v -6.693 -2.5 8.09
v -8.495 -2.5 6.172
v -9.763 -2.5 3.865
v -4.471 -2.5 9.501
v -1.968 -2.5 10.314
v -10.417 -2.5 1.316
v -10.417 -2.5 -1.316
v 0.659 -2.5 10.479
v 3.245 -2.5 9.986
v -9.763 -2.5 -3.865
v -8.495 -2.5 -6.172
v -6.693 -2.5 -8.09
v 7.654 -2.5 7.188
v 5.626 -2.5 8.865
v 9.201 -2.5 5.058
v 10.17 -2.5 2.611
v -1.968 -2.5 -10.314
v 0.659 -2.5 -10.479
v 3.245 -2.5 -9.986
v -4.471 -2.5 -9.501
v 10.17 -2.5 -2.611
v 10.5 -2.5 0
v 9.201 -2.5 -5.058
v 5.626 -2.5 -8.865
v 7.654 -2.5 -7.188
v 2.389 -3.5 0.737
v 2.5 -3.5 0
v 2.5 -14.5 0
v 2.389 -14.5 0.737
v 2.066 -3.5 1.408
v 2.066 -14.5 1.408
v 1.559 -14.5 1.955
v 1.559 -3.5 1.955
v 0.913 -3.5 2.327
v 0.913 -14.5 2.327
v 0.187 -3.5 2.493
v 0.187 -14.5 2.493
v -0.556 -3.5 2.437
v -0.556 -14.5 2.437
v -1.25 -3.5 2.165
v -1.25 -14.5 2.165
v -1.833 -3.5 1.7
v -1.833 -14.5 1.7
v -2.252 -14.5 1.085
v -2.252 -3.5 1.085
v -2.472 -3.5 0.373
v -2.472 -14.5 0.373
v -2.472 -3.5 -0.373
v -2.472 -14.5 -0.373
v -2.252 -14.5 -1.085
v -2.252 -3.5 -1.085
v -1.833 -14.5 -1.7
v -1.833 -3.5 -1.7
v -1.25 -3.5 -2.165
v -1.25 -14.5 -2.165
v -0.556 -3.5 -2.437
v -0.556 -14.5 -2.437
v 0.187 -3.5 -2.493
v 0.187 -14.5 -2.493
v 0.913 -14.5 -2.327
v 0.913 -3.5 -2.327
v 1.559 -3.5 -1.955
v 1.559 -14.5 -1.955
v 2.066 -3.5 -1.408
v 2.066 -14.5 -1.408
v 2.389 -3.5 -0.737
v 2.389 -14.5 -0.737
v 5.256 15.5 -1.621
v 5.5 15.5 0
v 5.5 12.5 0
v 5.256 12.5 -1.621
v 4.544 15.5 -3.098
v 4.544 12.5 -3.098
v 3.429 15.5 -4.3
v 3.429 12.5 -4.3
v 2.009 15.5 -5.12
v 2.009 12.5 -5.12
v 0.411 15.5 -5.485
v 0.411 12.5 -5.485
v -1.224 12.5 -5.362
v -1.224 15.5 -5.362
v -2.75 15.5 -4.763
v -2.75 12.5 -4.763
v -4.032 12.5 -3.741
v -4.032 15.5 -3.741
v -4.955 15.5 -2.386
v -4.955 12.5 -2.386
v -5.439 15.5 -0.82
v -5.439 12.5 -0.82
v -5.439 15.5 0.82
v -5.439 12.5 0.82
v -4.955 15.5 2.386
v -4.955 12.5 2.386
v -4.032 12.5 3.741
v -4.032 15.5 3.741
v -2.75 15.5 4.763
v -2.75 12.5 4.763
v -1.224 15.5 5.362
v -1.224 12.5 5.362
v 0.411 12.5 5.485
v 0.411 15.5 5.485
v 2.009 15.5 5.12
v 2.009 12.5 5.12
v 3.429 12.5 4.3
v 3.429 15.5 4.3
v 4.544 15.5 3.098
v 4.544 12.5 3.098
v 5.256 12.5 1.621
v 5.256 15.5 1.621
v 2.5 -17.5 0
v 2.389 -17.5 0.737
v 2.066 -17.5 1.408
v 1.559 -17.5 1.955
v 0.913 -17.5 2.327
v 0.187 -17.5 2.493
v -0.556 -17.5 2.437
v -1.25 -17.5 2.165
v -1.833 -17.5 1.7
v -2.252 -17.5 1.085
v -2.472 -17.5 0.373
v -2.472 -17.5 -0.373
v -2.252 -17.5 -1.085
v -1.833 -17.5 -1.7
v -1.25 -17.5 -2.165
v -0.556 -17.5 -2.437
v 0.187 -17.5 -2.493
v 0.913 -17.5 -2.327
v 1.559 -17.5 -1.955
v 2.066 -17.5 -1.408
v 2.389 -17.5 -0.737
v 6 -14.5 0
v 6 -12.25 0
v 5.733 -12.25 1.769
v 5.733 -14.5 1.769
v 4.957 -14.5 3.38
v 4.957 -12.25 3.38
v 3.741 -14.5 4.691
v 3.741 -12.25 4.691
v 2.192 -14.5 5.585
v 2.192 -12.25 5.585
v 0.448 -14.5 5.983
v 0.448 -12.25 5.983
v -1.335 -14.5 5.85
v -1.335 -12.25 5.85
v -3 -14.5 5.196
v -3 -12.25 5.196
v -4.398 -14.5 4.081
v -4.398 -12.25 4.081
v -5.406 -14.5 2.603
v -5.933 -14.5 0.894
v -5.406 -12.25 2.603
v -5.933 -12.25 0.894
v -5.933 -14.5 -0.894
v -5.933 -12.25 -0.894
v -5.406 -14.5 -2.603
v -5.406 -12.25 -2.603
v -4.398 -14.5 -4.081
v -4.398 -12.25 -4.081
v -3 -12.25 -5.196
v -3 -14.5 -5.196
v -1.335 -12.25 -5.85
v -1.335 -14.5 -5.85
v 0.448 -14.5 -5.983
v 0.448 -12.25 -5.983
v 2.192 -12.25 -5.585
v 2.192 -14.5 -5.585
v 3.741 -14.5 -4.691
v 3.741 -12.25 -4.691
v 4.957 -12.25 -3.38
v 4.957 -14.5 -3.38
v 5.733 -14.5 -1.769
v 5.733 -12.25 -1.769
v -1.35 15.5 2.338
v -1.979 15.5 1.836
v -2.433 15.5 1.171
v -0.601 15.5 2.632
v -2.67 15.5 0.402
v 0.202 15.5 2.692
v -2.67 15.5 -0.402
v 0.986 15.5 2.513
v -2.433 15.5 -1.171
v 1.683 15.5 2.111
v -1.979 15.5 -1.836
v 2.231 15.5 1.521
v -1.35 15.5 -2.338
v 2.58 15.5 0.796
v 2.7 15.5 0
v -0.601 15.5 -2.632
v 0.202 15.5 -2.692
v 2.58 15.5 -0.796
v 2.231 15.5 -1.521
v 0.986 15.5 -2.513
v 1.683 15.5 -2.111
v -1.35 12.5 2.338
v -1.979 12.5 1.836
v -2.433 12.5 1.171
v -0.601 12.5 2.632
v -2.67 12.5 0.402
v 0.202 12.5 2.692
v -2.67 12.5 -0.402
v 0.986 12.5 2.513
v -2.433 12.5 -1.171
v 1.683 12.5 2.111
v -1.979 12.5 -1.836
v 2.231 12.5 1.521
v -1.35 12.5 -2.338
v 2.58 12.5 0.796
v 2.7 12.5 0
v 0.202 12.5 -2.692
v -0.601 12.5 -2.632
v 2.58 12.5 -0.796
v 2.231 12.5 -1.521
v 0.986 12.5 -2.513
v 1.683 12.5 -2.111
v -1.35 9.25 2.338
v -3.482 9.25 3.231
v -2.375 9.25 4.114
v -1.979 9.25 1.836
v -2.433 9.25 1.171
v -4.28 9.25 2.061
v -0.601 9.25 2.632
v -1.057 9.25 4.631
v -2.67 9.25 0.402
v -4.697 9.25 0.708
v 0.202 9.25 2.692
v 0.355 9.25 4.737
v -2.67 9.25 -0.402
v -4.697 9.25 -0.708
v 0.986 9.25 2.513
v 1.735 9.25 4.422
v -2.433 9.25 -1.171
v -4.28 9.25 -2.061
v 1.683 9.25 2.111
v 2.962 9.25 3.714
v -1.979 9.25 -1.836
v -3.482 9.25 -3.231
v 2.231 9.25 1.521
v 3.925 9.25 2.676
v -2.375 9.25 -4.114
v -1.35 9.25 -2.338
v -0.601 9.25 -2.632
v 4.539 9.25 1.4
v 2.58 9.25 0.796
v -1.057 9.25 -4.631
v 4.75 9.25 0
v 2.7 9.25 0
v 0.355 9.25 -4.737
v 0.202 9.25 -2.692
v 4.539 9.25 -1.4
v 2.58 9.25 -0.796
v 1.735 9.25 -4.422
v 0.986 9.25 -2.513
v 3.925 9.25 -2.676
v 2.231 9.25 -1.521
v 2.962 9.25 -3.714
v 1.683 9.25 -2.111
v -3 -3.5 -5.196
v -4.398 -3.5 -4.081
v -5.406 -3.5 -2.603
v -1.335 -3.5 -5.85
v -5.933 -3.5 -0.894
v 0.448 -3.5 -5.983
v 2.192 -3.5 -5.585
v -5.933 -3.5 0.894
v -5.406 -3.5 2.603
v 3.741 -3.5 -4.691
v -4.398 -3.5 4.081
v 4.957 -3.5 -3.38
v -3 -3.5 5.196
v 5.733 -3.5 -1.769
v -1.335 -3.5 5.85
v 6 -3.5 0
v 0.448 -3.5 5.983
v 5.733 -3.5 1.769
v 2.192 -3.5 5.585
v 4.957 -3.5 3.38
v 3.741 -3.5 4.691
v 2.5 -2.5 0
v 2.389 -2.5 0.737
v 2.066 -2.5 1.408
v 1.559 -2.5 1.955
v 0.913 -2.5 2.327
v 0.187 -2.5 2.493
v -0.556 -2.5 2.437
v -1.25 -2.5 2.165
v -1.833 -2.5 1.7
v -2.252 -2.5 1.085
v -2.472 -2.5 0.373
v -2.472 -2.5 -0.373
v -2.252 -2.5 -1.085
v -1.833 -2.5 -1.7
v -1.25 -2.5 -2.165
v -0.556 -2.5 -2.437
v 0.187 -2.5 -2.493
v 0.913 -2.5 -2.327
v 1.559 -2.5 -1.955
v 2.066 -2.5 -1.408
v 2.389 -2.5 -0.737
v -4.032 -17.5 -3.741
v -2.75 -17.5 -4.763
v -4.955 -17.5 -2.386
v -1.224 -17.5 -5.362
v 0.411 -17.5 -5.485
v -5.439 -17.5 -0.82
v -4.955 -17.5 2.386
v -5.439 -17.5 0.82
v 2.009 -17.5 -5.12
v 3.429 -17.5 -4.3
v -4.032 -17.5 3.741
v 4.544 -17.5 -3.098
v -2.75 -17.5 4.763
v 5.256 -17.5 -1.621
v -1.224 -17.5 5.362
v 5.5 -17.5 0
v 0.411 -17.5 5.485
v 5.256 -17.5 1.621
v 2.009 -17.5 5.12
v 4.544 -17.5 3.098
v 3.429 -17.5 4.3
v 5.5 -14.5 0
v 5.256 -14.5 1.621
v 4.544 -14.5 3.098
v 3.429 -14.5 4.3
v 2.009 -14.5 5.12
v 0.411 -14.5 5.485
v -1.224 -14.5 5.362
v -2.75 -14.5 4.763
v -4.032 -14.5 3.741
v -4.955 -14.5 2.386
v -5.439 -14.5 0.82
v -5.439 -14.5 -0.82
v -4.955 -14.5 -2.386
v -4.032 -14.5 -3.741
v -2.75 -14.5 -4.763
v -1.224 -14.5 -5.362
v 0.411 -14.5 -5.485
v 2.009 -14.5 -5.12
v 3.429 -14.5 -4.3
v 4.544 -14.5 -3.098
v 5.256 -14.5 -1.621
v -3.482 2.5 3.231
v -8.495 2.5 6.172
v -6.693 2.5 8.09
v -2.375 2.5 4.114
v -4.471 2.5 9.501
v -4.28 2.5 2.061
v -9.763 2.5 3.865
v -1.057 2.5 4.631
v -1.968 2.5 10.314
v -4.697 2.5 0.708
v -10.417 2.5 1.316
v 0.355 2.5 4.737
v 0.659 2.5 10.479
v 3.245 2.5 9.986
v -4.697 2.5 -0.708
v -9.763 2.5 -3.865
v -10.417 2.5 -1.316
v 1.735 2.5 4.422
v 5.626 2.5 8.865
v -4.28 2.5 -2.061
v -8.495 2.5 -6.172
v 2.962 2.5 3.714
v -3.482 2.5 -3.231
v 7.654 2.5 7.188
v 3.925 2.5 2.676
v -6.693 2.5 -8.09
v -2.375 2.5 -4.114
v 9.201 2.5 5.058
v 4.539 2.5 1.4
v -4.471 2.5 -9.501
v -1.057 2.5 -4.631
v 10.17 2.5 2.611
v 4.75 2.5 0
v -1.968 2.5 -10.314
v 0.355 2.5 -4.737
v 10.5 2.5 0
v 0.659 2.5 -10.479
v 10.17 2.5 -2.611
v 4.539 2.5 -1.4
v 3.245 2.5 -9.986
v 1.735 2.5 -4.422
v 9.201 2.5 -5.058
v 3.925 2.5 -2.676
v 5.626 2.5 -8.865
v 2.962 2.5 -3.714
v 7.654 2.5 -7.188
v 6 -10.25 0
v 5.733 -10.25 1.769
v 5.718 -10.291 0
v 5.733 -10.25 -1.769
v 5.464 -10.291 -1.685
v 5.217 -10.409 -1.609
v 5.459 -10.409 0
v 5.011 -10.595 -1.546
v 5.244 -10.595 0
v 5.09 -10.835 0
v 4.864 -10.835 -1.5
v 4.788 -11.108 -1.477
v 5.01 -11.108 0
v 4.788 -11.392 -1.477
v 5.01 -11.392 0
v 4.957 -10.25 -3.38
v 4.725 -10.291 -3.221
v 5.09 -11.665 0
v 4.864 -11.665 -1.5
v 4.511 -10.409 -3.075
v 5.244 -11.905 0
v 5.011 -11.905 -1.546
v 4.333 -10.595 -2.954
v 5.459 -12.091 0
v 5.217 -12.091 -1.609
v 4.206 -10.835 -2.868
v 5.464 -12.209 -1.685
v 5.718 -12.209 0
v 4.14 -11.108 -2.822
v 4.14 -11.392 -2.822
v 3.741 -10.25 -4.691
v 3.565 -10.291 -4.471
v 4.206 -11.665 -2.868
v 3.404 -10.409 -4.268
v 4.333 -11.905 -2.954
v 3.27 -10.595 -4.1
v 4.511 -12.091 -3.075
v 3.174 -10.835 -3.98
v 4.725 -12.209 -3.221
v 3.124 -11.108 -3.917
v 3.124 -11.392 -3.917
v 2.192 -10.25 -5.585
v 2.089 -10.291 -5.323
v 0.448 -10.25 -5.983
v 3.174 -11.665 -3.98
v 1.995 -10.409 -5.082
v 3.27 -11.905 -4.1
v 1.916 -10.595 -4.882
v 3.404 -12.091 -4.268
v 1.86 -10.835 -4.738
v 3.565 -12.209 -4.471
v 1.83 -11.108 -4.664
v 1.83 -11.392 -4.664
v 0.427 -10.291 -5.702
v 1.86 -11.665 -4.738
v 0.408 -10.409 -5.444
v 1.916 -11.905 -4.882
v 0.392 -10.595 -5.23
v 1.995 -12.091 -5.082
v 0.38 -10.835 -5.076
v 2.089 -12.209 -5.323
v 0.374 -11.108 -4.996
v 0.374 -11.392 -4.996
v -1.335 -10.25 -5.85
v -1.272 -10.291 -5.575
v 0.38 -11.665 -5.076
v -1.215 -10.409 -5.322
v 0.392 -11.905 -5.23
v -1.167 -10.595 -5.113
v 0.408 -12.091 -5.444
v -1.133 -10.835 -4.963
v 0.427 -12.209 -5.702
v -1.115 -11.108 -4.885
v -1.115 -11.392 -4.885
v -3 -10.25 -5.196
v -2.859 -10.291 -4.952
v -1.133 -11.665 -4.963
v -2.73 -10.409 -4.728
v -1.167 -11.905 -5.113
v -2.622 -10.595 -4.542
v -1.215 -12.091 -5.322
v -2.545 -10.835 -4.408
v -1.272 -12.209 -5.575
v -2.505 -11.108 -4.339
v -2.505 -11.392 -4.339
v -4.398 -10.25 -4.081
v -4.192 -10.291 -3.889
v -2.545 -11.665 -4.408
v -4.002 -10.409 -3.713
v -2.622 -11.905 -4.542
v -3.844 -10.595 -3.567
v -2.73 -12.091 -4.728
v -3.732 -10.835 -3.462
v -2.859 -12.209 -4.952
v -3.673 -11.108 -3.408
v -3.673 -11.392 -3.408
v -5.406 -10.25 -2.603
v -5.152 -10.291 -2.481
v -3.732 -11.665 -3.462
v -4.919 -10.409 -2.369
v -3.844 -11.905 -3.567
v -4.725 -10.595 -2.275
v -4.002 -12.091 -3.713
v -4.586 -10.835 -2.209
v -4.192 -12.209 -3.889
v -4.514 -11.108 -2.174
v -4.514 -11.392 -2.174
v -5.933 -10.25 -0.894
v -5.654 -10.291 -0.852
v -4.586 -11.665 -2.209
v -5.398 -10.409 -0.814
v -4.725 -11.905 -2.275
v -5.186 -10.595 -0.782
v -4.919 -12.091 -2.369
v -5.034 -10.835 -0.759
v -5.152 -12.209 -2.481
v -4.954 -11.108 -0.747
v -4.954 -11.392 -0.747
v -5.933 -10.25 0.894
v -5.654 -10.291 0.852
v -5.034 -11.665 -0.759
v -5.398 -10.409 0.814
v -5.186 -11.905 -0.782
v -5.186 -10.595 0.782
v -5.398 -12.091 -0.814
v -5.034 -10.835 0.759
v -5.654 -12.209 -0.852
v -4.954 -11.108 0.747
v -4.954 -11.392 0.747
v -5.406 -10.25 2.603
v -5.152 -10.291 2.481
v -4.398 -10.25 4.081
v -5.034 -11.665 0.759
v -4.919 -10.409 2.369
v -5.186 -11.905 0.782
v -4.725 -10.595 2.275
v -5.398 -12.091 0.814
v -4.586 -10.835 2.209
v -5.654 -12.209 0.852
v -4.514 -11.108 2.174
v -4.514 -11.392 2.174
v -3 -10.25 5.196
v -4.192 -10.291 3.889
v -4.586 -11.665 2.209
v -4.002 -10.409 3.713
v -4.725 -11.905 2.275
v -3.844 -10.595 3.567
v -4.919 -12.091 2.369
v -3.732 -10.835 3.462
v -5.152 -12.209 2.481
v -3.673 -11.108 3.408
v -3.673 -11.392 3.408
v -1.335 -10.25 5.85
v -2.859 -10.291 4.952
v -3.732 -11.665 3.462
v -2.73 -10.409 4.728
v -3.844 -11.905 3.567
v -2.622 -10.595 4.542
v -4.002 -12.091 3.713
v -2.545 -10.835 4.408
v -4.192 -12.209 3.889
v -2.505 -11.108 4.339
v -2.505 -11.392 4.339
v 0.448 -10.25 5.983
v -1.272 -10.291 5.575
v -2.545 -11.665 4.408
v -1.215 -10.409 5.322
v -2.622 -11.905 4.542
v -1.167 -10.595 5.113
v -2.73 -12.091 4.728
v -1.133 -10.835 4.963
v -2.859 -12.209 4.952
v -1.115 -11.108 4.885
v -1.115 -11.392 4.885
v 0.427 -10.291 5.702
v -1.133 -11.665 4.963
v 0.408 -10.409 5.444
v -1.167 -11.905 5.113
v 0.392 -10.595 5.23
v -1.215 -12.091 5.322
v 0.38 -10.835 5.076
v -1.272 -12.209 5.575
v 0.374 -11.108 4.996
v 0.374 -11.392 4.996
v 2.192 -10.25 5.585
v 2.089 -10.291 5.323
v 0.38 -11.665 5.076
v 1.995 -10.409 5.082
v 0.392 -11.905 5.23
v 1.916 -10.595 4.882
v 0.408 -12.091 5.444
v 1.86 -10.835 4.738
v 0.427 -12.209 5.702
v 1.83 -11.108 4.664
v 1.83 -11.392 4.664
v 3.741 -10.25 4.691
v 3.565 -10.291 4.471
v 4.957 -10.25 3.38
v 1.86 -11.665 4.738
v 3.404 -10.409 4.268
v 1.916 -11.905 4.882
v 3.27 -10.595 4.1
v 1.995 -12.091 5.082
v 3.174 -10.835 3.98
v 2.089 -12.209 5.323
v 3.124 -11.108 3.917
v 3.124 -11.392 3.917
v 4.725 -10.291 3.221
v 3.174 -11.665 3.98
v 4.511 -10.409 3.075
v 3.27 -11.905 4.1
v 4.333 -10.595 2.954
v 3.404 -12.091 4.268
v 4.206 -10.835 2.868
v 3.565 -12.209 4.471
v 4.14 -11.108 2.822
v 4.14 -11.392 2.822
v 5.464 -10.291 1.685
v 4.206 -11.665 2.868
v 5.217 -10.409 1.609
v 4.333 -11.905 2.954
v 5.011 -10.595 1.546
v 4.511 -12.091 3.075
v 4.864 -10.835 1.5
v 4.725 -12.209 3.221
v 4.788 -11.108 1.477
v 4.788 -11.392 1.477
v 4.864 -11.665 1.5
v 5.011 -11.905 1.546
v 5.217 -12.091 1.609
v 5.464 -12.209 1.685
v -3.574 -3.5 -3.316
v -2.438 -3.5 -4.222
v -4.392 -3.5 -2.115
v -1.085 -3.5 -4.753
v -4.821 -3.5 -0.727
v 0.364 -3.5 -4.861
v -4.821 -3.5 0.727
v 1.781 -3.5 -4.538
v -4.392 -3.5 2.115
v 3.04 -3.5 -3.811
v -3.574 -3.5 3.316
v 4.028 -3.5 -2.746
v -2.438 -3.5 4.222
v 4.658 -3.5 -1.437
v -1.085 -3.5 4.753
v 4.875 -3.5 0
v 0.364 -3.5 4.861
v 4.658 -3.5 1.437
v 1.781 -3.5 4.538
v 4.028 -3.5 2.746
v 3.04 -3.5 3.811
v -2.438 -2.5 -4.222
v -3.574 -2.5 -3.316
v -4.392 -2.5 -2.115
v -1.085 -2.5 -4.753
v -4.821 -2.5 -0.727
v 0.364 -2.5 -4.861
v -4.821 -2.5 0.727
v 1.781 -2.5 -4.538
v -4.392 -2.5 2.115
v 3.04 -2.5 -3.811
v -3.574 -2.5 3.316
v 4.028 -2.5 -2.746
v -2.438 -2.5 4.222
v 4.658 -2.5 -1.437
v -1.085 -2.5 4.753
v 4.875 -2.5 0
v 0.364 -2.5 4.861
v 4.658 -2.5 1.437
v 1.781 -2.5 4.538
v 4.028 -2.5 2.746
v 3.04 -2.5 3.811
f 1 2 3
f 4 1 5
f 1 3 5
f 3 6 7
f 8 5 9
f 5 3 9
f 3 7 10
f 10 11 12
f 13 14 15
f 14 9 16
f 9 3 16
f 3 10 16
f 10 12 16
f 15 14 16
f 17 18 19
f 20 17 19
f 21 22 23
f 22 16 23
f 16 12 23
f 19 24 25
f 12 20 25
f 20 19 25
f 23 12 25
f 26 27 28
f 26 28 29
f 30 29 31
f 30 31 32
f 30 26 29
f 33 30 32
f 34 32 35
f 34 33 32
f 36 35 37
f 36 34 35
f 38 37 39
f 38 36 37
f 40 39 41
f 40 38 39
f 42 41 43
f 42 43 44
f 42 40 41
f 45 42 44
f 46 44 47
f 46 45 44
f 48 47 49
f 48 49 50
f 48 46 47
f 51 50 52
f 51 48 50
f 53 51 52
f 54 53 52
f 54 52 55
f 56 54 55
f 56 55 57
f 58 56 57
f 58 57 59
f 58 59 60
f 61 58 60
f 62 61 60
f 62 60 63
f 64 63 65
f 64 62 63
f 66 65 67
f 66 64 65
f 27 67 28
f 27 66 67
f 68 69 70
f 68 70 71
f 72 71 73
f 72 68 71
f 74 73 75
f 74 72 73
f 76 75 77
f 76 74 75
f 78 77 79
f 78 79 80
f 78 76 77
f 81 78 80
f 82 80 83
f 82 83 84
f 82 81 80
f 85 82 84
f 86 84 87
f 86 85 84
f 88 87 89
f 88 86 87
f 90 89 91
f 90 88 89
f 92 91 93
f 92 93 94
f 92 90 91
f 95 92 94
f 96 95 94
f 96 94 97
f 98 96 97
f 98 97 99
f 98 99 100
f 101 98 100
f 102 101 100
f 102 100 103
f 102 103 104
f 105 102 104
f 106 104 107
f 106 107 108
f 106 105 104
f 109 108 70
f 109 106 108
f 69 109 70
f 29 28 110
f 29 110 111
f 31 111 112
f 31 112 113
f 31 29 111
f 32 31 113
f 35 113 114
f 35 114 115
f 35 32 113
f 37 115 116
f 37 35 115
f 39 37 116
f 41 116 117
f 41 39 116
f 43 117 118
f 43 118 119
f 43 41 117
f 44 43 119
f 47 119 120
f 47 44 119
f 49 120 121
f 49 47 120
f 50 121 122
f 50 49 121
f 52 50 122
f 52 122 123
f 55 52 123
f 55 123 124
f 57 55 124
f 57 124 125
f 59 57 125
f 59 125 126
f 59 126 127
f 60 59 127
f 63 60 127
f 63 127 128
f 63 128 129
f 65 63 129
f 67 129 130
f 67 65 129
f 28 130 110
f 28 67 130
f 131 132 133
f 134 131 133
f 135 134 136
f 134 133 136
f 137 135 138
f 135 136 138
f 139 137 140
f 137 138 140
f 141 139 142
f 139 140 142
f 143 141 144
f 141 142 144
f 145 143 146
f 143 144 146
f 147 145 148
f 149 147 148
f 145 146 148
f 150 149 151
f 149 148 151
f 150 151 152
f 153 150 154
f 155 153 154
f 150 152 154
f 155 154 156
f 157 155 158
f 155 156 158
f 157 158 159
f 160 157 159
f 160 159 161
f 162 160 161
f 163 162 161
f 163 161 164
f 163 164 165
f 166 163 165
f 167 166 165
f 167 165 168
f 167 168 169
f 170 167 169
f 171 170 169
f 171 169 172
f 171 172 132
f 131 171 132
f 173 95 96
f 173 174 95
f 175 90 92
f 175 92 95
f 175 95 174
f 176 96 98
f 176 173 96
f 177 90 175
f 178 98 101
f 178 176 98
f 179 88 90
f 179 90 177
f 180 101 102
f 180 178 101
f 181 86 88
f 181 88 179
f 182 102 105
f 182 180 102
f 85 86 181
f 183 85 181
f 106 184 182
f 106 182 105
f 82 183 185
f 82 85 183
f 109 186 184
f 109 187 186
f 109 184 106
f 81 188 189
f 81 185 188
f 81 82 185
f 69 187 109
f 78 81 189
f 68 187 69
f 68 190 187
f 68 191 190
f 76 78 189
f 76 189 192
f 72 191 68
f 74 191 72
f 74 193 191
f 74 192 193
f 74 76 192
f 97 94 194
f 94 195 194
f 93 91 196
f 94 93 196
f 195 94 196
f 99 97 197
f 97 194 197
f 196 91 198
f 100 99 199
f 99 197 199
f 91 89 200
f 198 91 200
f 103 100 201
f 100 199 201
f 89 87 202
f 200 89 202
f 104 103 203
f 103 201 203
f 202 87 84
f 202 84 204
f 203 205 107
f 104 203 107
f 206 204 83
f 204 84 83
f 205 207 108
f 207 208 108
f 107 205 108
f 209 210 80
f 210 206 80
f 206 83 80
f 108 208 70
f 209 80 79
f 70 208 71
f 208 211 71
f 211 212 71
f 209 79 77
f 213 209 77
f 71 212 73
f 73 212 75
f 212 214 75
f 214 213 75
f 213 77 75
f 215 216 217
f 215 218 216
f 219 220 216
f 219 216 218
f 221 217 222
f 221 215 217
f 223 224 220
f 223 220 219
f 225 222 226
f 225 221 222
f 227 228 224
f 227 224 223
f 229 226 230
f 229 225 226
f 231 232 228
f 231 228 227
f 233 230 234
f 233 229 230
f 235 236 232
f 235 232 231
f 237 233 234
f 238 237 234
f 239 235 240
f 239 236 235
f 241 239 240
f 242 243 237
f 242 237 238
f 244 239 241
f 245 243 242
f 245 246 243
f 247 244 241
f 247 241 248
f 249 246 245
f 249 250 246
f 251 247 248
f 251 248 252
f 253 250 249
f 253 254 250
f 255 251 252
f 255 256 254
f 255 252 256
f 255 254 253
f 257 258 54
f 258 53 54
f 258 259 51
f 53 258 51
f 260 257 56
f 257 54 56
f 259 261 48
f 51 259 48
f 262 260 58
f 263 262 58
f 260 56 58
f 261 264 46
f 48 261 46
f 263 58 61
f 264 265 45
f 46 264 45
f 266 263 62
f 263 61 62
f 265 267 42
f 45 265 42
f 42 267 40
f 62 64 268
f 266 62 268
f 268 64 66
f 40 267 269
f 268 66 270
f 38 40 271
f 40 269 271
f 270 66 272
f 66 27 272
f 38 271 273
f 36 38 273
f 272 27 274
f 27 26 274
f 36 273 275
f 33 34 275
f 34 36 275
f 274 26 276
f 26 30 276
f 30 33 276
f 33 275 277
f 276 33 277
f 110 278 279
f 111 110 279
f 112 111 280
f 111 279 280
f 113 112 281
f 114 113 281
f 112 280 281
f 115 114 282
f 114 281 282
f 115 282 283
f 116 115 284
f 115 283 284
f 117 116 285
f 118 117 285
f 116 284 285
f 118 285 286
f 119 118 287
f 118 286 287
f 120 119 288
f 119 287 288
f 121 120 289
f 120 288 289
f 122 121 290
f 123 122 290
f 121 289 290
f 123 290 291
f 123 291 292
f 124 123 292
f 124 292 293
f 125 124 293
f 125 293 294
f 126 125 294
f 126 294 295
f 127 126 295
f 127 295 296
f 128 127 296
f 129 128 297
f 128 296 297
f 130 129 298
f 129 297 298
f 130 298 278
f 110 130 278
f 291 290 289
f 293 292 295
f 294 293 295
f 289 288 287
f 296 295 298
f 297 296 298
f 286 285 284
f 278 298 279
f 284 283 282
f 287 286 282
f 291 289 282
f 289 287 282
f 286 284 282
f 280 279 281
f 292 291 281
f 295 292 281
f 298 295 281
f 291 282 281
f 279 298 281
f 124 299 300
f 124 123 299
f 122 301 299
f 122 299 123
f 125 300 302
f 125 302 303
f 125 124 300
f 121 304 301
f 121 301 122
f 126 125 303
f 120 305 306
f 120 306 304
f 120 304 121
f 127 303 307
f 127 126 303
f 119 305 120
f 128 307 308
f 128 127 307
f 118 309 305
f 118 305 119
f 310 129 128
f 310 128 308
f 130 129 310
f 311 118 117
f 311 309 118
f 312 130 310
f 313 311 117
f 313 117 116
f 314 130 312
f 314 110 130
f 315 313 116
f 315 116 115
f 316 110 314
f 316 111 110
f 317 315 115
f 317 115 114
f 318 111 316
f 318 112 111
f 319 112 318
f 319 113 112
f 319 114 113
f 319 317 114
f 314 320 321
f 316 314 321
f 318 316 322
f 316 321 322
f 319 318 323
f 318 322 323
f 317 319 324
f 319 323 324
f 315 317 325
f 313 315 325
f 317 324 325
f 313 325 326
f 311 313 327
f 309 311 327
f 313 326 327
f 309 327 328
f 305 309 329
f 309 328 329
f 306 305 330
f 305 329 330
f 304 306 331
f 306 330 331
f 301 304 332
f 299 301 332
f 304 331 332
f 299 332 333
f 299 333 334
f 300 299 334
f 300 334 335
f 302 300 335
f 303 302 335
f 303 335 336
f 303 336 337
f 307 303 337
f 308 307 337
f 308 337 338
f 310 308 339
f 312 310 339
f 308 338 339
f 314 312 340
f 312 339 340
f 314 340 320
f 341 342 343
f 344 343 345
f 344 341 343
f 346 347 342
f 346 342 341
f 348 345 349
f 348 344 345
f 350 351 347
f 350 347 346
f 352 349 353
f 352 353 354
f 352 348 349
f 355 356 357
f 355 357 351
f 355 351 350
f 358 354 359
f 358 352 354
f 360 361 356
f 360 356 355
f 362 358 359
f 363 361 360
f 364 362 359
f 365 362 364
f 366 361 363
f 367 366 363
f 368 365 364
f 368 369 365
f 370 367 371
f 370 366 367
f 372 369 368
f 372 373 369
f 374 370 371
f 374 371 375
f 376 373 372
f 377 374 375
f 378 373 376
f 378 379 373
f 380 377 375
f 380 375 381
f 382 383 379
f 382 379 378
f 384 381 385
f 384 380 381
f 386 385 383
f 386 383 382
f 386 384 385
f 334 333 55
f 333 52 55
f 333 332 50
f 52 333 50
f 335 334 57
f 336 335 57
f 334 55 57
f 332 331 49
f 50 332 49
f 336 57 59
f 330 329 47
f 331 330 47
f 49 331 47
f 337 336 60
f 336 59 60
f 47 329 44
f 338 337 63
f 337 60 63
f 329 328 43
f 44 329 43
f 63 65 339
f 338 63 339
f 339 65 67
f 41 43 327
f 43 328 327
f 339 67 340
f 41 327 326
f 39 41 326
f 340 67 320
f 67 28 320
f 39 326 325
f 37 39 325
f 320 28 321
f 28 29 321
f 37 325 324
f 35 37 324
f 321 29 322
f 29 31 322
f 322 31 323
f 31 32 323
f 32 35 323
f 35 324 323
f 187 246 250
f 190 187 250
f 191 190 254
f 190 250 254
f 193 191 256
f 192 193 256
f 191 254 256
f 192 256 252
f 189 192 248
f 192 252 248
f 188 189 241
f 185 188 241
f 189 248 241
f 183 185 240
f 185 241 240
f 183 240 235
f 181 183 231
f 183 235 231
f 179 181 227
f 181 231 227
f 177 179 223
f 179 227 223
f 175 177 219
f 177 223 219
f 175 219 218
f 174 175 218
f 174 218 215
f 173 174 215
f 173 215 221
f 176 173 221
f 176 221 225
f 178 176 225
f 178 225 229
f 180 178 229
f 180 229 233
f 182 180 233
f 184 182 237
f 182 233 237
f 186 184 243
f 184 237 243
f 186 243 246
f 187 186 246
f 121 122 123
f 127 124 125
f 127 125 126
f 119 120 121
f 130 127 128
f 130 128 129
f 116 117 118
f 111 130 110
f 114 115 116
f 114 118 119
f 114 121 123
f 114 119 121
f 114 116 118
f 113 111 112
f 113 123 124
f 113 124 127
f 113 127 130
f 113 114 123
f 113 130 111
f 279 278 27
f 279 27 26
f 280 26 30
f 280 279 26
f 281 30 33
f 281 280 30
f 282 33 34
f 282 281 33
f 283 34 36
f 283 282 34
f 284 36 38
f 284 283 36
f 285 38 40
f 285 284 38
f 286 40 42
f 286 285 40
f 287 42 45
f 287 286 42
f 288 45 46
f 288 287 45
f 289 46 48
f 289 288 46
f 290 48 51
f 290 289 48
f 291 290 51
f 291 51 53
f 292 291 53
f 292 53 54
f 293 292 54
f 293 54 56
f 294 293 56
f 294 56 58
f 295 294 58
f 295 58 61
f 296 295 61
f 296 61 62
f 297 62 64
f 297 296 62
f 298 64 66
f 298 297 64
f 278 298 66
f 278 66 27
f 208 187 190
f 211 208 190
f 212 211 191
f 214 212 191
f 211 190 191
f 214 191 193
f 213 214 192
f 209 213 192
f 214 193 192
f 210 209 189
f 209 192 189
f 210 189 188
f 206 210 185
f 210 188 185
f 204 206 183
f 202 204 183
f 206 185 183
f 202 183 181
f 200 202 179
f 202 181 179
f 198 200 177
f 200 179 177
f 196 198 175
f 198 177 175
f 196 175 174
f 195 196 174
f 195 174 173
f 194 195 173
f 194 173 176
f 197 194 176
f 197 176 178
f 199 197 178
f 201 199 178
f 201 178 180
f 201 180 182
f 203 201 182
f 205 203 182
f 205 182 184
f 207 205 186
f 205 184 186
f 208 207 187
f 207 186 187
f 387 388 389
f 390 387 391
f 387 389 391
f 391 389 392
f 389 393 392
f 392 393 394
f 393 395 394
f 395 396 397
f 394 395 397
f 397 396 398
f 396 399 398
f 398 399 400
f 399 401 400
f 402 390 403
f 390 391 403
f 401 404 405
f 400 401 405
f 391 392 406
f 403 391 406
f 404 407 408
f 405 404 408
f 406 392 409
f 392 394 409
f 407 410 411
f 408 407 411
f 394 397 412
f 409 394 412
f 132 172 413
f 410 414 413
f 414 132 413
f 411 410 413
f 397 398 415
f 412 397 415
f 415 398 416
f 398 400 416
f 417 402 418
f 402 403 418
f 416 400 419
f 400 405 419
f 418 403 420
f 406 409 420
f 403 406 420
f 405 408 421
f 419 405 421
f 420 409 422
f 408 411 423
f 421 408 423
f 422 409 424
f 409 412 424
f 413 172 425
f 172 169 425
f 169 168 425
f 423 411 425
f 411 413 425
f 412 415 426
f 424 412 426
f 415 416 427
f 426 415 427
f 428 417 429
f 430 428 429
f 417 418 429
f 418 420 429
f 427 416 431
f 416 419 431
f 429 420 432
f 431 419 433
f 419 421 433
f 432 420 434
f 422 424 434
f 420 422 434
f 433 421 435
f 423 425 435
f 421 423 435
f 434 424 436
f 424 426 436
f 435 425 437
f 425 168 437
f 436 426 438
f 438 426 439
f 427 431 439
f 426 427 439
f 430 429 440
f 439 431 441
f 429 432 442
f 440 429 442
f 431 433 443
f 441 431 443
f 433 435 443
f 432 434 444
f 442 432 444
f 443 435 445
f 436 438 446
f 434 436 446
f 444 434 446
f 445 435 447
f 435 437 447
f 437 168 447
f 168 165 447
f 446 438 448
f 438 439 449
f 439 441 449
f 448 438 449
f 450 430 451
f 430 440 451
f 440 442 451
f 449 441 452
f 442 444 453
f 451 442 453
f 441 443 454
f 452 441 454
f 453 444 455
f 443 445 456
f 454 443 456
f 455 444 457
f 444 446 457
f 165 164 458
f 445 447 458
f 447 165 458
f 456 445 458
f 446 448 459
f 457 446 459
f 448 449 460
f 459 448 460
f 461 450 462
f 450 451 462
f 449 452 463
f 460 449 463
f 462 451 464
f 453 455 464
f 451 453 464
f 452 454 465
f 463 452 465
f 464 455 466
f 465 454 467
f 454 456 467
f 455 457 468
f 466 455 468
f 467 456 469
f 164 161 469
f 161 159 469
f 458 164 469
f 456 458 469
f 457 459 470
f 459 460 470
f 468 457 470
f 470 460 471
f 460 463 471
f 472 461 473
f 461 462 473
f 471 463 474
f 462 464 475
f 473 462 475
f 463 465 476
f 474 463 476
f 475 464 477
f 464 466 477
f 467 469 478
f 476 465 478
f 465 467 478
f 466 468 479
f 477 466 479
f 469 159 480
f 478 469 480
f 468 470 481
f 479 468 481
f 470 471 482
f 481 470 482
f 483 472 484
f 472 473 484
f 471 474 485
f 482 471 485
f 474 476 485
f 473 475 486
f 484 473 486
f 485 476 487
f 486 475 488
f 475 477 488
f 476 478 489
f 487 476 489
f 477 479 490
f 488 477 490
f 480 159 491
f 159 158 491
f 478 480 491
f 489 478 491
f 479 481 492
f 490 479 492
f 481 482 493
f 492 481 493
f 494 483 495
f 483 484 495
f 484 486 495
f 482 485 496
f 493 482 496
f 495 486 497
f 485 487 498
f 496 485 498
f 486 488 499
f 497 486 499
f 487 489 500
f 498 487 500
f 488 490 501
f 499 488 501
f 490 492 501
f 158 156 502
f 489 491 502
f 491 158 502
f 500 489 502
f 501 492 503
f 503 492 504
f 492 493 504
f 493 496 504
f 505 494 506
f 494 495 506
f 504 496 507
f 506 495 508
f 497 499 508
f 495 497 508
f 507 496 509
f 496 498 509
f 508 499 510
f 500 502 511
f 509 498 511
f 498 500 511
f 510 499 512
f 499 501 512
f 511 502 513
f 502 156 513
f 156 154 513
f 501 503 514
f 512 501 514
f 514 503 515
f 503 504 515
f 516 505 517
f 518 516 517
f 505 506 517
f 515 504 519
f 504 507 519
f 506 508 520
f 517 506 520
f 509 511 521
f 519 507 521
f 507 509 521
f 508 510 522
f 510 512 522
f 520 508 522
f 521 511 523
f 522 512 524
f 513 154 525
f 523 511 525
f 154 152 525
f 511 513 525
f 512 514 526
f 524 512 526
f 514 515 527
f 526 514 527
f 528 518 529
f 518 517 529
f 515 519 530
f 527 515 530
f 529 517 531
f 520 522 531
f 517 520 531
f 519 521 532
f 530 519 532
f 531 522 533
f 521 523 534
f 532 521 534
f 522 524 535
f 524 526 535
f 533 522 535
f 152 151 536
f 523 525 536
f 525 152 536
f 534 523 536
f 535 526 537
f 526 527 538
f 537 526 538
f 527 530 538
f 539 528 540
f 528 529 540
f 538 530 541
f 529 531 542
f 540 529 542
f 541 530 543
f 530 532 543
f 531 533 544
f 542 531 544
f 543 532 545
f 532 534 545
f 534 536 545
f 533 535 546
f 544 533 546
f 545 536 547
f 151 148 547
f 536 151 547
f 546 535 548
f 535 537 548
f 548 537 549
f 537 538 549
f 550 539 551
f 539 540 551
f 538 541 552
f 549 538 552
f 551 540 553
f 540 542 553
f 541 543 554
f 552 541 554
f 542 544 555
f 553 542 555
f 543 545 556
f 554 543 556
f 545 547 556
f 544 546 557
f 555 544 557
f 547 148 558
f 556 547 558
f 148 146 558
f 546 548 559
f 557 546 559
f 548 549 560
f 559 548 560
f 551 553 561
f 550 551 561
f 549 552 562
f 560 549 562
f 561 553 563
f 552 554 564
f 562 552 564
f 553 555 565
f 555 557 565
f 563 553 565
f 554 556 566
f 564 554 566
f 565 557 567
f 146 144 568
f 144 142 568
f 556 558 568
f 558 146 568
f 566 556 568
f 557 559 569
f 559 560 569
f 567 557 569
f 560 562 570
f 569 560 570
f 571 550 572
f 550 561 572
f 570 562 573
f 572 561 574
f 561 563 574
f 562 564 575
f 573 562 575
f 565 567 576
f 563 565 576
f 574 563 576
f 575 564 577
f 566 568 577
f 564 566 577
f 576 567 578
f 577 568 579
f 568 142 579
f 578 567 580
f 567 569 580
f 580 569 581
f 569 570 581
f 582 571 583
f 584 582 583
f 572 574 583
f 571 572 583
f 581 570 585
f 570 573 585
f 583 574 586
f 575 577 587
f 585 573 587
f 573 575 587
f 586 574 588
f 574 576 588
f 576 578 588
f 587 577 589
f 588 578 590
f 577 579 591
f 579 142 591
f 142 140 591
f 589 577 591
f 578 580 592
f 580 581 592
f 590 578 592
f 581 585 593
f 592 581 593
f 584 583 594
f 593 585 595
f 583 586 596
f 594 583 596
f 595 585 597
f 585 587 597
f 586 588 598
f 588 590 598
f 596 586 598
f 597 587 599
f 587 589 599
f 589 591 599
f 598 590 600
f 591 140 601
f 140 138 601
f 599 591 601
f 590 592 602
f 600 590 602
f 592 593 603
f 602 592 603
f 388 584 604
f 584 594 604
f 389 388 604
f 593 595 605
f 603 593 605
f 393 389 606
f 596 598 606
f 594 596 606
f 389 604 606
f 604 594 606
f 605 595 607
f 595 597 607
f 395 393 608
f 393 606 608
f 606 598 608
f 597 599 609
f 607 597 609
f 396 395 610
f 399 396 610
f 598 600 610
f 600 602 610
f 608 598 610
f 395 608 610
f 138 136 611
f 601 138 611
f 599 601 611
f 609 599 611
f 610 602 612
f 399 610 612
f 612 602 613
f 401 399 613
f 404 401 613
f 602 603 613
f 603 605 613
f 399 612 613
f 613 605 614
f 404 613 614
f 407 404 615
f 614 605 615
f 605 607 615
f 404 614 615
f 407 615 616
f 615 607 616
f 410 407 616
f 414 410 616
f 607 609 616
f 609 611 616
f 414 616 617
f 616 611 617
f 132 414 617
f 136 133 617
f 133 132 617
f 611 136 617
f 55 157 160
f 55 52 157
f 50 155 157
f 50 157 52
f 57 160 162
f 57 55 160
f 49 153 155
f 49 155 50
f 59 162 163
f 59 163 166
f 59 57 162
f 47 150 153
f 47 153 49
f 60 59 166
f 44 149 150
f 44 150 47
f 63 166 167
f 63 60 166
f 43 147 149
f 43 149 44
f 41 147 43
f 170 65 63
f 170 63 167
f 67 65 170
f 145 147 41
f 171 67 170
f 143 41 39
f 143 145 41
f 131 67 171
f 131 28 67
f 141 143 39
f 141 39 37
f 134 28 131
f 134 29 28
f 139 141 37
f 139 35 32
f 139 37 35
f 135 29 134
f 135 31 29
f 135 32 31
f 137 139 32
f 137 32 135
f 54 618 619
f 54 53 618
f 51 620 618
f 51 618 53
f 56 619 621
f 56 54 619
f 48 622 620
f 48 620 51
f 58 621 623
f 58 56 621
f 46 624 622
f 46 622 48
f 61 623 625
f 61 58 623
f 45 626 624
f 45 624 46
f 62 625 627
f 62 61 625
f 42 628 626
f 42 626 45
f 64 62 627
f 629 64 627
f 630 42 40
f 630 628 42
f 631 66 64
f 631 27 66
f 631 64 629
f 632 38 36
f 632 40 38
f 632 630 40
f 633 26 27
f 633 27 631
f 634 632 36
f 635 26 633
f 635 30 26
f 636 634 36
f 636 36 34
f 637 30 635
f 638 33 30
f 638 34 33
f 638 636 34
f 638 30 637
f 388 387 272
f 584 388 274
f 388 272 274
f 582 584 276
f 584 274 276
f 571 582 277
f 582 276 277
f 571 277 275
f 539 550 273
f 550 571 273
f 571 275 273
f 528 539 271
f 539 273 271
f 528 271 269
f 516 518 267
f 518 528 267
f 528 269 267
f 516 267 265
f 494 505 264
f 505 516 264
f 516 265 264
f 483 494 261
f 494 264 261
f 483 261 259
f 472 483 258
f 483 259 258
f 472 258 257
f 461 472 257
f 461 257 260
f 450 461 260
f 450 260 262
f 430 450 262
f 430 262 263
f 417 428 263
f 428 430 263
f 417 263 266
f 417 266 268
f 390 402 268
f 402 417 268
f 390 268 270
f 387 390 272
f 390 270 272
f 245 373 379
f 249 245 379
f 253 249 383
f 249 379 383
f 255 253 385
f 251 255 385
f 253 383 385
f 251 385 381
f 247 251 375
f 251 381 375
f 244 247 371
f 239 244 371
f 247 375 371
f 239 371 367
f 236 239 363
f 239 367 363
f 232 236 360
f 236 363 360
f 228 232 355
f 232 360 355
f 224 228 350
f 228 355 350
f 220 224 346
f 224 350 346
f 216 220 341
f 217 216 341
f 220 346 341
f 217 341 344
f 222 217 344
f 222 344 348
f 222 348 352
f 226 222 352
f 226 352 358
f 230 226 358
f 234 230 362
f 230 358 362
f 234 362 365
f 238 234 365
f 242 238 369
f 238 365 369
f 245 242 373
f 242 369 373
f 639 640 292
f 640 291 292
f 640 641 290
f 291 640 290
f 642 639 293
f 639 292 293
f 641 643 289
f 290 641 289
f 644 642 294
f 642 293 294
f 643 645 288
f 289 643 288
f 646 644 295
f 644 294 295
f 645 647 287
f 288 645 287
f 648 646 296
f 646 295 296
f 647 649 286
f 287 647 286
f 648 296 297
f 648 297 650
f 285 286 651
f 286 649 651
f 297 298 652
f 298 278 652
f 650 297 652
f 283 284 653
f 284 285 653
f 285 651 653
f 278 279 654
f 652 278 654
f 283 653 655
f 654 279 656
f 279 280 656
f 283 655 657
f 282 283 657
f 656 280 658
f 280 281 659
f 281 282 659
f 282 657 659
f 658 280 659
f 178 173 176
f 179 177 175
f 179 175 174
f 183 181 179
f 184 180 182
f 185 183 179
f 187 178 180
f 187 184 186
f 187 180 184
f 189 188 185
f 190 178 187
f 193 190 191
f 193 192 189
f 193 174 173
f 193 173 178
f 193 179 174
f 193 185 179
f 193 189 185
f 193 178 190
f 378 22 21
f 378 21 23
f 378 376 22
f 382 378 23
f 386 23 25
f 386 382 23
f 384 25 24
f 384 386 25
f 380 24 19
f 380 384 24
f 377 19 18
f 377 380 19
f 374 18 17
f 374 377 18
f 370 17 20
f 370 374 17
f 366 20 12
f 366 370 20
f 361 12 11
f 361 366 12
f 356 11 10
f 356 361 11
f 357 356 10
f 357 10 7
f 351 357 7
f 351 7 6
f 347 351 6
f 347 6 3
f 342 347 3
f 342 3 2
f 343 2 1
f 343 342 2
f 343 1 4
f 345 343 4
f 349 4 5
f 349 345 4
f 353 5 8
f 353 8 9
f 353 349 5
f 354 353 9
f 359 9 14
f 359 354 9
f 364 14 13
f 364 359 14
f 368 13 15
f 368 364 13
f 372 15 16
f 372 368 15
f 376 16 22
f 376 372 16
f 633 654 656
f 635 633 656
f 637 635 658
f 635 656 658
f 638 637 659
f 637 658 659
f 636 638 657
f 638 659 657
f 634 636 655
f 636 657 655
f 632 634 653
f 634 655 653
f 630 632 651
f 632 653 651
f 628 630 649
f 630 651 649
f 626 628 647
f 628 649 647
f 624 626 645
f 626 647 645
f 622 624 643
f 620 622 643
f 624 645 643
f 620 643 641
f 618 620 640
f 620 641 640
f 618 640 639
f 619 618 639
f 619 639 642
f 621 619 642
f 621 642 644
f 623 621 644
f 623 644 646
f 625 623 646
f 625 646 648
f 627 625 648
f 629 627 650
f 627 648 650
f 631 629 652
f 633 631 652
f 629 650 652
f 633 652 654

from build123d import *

# Parameters (mm, degrees)
BOSS_EXTRUDE1_DEPTH      = 2.5
BOSS_EXTRUDE1_DEPTH_BACK = 2.5
SKETCH1_R                = 10.5
SKETCH2_R                = 4.75
BOSS_EXTRUDE2_DEPTH      = 6.75
SKETCH3_R                = 2.7
BOSS_EXTRUDE4_DEPTH      = 6.25
SKETCH5_R                = 5.5
SKETCH5_R_2              = 2.7
BOSS_EXTRUDE5_DEPTH      = 3
SKETCH6_R                = 2.5
BOSS_EXTRUDE6_DEPTH      = 15
SKETCH7_R                = 4.875
SKETCH7_R_2              = 2.5
BOSS_EXTRUDE7_DEPTH      = 1
SKETCH8_R                = 6
SKETCH8_R_2              = 2.5
BOSS_EXTRUDE8_DEPTH      = 11
SKETCH9_R                = 1
SKETCH10_R               = 5.5
SKETCH10_R_2             = 2.5
BOSS_EXTRUDE12_DEPTH     = 3


with BuildPart() as part:
    # Sketch1 → Boss-Extrude1 (new, two sides: drawn at the far end of the back side and taken through both)
    with BuildSketch(Plane(origin=(0, 0, 0), x_dir=(1, 0, 0), z_dir=(0, 1, 0)).offset(-BOSS_EXTRUDE1_DEPTH_BACK)):
        Circle(SKETCH1_R)
    extrude(amount=BOSS_EXTRUDE1_DEPTH + BOSS_EXTRUDE1_DEPTH_BACK)

    # Sketch2 → Boss-Extrude2 (add)
    with BuildSketch(Plane(origin=(0, 2.5, 0), x_dir=(1, 0, 0), z_dir=(0, 1, 0))):
        Circle(SKETCH2_R)
    extrude(amount=BOSS_EXTRUDE2_DEPTH)

    # Sketch3 → Boss-Extrude4 (add)
    with BuildSketch(Plane(origin=(0, 9.25, 0), x_dir=(1, 0, 0), z_dir=(0, 1, 0))):
        Circle(SKETCH3_R)
    extrude(amount=BOSS_EXTRUDE4_DEPTH)


with BuildPart() as body_2:
    # Sketch5 → Boss-Extrude5 (new body)
    with BuildSketch(Plane(origin=(0, 15.5, 0), x_dir=(1, 0, 0), z_dir=(0, 1, 0))):
        Circle(SKETCH5_R)
        Circle(SKETCH5_R_2, mode=Mode.SUBTRACT)
    extrude(amount=-BOSS_EXTRUDE5_DEPTH)


with BuildPart() as body_3:
    # Sketch6 → Boss-Extrude6 (new body)
    with BuildSketch(Plane.XZ.offset(2.5)):
        Circle(SKETCH6_R)
    extrude(amount=BOSS_EXTRUDE6_DEPTH)


with BuildPart() as body_4:
    # Sketch7 → Boss-Extrude7 (new body)
    with BuildSketch(Plane.XZ.offset(2.5)):
        Circle(SKETCH7_R)
        Circle(SKETCH7_R_2, mode=Mode.SUBTRACT)
    extrude(amount=BOSS_EXTRUDE7_DEPTH)


with BuildPart() as body_5:
    # Sketch8 → Boss-Extrude8 (new body)
    with BuildSketch(Plane.XZ.offset(3.5)):
        Circle(SKETCH8_R)
        Circle(SKETCH8_R_2, mode=Mode.SUBTRACT)
    extrude(amount=BOSS_EXTRUDE8_DEPTH)

    # Sketch9 → Cut-Revolve1 (revolve, cut)
    with BuildSketch(Plane.XY):
        with Locations((6, -11.25)):
            Circle(SKETCH9_R)
    revolve(axis=Axis((0, -29.718418544, 0), (0, 1, 0)), mode=Mode.SUBTRACT)


with BuildPart() as body_6:
    # Sketch10 → Boss-Extrude12 (new body)
    with BuildSketch(Plane.XZ.offset(14.5)):
        Circle(SKETCH10_R)
        Circle(SKETCH10_R_2, mode=Mode.SUBTRACT)
    extrude(amount=BOSS_EXTRUDE12_DEPTH)


solid = Compound([part.part, body_2.part, body_3.part, body_4.part, body_5.part, body_6.part])
